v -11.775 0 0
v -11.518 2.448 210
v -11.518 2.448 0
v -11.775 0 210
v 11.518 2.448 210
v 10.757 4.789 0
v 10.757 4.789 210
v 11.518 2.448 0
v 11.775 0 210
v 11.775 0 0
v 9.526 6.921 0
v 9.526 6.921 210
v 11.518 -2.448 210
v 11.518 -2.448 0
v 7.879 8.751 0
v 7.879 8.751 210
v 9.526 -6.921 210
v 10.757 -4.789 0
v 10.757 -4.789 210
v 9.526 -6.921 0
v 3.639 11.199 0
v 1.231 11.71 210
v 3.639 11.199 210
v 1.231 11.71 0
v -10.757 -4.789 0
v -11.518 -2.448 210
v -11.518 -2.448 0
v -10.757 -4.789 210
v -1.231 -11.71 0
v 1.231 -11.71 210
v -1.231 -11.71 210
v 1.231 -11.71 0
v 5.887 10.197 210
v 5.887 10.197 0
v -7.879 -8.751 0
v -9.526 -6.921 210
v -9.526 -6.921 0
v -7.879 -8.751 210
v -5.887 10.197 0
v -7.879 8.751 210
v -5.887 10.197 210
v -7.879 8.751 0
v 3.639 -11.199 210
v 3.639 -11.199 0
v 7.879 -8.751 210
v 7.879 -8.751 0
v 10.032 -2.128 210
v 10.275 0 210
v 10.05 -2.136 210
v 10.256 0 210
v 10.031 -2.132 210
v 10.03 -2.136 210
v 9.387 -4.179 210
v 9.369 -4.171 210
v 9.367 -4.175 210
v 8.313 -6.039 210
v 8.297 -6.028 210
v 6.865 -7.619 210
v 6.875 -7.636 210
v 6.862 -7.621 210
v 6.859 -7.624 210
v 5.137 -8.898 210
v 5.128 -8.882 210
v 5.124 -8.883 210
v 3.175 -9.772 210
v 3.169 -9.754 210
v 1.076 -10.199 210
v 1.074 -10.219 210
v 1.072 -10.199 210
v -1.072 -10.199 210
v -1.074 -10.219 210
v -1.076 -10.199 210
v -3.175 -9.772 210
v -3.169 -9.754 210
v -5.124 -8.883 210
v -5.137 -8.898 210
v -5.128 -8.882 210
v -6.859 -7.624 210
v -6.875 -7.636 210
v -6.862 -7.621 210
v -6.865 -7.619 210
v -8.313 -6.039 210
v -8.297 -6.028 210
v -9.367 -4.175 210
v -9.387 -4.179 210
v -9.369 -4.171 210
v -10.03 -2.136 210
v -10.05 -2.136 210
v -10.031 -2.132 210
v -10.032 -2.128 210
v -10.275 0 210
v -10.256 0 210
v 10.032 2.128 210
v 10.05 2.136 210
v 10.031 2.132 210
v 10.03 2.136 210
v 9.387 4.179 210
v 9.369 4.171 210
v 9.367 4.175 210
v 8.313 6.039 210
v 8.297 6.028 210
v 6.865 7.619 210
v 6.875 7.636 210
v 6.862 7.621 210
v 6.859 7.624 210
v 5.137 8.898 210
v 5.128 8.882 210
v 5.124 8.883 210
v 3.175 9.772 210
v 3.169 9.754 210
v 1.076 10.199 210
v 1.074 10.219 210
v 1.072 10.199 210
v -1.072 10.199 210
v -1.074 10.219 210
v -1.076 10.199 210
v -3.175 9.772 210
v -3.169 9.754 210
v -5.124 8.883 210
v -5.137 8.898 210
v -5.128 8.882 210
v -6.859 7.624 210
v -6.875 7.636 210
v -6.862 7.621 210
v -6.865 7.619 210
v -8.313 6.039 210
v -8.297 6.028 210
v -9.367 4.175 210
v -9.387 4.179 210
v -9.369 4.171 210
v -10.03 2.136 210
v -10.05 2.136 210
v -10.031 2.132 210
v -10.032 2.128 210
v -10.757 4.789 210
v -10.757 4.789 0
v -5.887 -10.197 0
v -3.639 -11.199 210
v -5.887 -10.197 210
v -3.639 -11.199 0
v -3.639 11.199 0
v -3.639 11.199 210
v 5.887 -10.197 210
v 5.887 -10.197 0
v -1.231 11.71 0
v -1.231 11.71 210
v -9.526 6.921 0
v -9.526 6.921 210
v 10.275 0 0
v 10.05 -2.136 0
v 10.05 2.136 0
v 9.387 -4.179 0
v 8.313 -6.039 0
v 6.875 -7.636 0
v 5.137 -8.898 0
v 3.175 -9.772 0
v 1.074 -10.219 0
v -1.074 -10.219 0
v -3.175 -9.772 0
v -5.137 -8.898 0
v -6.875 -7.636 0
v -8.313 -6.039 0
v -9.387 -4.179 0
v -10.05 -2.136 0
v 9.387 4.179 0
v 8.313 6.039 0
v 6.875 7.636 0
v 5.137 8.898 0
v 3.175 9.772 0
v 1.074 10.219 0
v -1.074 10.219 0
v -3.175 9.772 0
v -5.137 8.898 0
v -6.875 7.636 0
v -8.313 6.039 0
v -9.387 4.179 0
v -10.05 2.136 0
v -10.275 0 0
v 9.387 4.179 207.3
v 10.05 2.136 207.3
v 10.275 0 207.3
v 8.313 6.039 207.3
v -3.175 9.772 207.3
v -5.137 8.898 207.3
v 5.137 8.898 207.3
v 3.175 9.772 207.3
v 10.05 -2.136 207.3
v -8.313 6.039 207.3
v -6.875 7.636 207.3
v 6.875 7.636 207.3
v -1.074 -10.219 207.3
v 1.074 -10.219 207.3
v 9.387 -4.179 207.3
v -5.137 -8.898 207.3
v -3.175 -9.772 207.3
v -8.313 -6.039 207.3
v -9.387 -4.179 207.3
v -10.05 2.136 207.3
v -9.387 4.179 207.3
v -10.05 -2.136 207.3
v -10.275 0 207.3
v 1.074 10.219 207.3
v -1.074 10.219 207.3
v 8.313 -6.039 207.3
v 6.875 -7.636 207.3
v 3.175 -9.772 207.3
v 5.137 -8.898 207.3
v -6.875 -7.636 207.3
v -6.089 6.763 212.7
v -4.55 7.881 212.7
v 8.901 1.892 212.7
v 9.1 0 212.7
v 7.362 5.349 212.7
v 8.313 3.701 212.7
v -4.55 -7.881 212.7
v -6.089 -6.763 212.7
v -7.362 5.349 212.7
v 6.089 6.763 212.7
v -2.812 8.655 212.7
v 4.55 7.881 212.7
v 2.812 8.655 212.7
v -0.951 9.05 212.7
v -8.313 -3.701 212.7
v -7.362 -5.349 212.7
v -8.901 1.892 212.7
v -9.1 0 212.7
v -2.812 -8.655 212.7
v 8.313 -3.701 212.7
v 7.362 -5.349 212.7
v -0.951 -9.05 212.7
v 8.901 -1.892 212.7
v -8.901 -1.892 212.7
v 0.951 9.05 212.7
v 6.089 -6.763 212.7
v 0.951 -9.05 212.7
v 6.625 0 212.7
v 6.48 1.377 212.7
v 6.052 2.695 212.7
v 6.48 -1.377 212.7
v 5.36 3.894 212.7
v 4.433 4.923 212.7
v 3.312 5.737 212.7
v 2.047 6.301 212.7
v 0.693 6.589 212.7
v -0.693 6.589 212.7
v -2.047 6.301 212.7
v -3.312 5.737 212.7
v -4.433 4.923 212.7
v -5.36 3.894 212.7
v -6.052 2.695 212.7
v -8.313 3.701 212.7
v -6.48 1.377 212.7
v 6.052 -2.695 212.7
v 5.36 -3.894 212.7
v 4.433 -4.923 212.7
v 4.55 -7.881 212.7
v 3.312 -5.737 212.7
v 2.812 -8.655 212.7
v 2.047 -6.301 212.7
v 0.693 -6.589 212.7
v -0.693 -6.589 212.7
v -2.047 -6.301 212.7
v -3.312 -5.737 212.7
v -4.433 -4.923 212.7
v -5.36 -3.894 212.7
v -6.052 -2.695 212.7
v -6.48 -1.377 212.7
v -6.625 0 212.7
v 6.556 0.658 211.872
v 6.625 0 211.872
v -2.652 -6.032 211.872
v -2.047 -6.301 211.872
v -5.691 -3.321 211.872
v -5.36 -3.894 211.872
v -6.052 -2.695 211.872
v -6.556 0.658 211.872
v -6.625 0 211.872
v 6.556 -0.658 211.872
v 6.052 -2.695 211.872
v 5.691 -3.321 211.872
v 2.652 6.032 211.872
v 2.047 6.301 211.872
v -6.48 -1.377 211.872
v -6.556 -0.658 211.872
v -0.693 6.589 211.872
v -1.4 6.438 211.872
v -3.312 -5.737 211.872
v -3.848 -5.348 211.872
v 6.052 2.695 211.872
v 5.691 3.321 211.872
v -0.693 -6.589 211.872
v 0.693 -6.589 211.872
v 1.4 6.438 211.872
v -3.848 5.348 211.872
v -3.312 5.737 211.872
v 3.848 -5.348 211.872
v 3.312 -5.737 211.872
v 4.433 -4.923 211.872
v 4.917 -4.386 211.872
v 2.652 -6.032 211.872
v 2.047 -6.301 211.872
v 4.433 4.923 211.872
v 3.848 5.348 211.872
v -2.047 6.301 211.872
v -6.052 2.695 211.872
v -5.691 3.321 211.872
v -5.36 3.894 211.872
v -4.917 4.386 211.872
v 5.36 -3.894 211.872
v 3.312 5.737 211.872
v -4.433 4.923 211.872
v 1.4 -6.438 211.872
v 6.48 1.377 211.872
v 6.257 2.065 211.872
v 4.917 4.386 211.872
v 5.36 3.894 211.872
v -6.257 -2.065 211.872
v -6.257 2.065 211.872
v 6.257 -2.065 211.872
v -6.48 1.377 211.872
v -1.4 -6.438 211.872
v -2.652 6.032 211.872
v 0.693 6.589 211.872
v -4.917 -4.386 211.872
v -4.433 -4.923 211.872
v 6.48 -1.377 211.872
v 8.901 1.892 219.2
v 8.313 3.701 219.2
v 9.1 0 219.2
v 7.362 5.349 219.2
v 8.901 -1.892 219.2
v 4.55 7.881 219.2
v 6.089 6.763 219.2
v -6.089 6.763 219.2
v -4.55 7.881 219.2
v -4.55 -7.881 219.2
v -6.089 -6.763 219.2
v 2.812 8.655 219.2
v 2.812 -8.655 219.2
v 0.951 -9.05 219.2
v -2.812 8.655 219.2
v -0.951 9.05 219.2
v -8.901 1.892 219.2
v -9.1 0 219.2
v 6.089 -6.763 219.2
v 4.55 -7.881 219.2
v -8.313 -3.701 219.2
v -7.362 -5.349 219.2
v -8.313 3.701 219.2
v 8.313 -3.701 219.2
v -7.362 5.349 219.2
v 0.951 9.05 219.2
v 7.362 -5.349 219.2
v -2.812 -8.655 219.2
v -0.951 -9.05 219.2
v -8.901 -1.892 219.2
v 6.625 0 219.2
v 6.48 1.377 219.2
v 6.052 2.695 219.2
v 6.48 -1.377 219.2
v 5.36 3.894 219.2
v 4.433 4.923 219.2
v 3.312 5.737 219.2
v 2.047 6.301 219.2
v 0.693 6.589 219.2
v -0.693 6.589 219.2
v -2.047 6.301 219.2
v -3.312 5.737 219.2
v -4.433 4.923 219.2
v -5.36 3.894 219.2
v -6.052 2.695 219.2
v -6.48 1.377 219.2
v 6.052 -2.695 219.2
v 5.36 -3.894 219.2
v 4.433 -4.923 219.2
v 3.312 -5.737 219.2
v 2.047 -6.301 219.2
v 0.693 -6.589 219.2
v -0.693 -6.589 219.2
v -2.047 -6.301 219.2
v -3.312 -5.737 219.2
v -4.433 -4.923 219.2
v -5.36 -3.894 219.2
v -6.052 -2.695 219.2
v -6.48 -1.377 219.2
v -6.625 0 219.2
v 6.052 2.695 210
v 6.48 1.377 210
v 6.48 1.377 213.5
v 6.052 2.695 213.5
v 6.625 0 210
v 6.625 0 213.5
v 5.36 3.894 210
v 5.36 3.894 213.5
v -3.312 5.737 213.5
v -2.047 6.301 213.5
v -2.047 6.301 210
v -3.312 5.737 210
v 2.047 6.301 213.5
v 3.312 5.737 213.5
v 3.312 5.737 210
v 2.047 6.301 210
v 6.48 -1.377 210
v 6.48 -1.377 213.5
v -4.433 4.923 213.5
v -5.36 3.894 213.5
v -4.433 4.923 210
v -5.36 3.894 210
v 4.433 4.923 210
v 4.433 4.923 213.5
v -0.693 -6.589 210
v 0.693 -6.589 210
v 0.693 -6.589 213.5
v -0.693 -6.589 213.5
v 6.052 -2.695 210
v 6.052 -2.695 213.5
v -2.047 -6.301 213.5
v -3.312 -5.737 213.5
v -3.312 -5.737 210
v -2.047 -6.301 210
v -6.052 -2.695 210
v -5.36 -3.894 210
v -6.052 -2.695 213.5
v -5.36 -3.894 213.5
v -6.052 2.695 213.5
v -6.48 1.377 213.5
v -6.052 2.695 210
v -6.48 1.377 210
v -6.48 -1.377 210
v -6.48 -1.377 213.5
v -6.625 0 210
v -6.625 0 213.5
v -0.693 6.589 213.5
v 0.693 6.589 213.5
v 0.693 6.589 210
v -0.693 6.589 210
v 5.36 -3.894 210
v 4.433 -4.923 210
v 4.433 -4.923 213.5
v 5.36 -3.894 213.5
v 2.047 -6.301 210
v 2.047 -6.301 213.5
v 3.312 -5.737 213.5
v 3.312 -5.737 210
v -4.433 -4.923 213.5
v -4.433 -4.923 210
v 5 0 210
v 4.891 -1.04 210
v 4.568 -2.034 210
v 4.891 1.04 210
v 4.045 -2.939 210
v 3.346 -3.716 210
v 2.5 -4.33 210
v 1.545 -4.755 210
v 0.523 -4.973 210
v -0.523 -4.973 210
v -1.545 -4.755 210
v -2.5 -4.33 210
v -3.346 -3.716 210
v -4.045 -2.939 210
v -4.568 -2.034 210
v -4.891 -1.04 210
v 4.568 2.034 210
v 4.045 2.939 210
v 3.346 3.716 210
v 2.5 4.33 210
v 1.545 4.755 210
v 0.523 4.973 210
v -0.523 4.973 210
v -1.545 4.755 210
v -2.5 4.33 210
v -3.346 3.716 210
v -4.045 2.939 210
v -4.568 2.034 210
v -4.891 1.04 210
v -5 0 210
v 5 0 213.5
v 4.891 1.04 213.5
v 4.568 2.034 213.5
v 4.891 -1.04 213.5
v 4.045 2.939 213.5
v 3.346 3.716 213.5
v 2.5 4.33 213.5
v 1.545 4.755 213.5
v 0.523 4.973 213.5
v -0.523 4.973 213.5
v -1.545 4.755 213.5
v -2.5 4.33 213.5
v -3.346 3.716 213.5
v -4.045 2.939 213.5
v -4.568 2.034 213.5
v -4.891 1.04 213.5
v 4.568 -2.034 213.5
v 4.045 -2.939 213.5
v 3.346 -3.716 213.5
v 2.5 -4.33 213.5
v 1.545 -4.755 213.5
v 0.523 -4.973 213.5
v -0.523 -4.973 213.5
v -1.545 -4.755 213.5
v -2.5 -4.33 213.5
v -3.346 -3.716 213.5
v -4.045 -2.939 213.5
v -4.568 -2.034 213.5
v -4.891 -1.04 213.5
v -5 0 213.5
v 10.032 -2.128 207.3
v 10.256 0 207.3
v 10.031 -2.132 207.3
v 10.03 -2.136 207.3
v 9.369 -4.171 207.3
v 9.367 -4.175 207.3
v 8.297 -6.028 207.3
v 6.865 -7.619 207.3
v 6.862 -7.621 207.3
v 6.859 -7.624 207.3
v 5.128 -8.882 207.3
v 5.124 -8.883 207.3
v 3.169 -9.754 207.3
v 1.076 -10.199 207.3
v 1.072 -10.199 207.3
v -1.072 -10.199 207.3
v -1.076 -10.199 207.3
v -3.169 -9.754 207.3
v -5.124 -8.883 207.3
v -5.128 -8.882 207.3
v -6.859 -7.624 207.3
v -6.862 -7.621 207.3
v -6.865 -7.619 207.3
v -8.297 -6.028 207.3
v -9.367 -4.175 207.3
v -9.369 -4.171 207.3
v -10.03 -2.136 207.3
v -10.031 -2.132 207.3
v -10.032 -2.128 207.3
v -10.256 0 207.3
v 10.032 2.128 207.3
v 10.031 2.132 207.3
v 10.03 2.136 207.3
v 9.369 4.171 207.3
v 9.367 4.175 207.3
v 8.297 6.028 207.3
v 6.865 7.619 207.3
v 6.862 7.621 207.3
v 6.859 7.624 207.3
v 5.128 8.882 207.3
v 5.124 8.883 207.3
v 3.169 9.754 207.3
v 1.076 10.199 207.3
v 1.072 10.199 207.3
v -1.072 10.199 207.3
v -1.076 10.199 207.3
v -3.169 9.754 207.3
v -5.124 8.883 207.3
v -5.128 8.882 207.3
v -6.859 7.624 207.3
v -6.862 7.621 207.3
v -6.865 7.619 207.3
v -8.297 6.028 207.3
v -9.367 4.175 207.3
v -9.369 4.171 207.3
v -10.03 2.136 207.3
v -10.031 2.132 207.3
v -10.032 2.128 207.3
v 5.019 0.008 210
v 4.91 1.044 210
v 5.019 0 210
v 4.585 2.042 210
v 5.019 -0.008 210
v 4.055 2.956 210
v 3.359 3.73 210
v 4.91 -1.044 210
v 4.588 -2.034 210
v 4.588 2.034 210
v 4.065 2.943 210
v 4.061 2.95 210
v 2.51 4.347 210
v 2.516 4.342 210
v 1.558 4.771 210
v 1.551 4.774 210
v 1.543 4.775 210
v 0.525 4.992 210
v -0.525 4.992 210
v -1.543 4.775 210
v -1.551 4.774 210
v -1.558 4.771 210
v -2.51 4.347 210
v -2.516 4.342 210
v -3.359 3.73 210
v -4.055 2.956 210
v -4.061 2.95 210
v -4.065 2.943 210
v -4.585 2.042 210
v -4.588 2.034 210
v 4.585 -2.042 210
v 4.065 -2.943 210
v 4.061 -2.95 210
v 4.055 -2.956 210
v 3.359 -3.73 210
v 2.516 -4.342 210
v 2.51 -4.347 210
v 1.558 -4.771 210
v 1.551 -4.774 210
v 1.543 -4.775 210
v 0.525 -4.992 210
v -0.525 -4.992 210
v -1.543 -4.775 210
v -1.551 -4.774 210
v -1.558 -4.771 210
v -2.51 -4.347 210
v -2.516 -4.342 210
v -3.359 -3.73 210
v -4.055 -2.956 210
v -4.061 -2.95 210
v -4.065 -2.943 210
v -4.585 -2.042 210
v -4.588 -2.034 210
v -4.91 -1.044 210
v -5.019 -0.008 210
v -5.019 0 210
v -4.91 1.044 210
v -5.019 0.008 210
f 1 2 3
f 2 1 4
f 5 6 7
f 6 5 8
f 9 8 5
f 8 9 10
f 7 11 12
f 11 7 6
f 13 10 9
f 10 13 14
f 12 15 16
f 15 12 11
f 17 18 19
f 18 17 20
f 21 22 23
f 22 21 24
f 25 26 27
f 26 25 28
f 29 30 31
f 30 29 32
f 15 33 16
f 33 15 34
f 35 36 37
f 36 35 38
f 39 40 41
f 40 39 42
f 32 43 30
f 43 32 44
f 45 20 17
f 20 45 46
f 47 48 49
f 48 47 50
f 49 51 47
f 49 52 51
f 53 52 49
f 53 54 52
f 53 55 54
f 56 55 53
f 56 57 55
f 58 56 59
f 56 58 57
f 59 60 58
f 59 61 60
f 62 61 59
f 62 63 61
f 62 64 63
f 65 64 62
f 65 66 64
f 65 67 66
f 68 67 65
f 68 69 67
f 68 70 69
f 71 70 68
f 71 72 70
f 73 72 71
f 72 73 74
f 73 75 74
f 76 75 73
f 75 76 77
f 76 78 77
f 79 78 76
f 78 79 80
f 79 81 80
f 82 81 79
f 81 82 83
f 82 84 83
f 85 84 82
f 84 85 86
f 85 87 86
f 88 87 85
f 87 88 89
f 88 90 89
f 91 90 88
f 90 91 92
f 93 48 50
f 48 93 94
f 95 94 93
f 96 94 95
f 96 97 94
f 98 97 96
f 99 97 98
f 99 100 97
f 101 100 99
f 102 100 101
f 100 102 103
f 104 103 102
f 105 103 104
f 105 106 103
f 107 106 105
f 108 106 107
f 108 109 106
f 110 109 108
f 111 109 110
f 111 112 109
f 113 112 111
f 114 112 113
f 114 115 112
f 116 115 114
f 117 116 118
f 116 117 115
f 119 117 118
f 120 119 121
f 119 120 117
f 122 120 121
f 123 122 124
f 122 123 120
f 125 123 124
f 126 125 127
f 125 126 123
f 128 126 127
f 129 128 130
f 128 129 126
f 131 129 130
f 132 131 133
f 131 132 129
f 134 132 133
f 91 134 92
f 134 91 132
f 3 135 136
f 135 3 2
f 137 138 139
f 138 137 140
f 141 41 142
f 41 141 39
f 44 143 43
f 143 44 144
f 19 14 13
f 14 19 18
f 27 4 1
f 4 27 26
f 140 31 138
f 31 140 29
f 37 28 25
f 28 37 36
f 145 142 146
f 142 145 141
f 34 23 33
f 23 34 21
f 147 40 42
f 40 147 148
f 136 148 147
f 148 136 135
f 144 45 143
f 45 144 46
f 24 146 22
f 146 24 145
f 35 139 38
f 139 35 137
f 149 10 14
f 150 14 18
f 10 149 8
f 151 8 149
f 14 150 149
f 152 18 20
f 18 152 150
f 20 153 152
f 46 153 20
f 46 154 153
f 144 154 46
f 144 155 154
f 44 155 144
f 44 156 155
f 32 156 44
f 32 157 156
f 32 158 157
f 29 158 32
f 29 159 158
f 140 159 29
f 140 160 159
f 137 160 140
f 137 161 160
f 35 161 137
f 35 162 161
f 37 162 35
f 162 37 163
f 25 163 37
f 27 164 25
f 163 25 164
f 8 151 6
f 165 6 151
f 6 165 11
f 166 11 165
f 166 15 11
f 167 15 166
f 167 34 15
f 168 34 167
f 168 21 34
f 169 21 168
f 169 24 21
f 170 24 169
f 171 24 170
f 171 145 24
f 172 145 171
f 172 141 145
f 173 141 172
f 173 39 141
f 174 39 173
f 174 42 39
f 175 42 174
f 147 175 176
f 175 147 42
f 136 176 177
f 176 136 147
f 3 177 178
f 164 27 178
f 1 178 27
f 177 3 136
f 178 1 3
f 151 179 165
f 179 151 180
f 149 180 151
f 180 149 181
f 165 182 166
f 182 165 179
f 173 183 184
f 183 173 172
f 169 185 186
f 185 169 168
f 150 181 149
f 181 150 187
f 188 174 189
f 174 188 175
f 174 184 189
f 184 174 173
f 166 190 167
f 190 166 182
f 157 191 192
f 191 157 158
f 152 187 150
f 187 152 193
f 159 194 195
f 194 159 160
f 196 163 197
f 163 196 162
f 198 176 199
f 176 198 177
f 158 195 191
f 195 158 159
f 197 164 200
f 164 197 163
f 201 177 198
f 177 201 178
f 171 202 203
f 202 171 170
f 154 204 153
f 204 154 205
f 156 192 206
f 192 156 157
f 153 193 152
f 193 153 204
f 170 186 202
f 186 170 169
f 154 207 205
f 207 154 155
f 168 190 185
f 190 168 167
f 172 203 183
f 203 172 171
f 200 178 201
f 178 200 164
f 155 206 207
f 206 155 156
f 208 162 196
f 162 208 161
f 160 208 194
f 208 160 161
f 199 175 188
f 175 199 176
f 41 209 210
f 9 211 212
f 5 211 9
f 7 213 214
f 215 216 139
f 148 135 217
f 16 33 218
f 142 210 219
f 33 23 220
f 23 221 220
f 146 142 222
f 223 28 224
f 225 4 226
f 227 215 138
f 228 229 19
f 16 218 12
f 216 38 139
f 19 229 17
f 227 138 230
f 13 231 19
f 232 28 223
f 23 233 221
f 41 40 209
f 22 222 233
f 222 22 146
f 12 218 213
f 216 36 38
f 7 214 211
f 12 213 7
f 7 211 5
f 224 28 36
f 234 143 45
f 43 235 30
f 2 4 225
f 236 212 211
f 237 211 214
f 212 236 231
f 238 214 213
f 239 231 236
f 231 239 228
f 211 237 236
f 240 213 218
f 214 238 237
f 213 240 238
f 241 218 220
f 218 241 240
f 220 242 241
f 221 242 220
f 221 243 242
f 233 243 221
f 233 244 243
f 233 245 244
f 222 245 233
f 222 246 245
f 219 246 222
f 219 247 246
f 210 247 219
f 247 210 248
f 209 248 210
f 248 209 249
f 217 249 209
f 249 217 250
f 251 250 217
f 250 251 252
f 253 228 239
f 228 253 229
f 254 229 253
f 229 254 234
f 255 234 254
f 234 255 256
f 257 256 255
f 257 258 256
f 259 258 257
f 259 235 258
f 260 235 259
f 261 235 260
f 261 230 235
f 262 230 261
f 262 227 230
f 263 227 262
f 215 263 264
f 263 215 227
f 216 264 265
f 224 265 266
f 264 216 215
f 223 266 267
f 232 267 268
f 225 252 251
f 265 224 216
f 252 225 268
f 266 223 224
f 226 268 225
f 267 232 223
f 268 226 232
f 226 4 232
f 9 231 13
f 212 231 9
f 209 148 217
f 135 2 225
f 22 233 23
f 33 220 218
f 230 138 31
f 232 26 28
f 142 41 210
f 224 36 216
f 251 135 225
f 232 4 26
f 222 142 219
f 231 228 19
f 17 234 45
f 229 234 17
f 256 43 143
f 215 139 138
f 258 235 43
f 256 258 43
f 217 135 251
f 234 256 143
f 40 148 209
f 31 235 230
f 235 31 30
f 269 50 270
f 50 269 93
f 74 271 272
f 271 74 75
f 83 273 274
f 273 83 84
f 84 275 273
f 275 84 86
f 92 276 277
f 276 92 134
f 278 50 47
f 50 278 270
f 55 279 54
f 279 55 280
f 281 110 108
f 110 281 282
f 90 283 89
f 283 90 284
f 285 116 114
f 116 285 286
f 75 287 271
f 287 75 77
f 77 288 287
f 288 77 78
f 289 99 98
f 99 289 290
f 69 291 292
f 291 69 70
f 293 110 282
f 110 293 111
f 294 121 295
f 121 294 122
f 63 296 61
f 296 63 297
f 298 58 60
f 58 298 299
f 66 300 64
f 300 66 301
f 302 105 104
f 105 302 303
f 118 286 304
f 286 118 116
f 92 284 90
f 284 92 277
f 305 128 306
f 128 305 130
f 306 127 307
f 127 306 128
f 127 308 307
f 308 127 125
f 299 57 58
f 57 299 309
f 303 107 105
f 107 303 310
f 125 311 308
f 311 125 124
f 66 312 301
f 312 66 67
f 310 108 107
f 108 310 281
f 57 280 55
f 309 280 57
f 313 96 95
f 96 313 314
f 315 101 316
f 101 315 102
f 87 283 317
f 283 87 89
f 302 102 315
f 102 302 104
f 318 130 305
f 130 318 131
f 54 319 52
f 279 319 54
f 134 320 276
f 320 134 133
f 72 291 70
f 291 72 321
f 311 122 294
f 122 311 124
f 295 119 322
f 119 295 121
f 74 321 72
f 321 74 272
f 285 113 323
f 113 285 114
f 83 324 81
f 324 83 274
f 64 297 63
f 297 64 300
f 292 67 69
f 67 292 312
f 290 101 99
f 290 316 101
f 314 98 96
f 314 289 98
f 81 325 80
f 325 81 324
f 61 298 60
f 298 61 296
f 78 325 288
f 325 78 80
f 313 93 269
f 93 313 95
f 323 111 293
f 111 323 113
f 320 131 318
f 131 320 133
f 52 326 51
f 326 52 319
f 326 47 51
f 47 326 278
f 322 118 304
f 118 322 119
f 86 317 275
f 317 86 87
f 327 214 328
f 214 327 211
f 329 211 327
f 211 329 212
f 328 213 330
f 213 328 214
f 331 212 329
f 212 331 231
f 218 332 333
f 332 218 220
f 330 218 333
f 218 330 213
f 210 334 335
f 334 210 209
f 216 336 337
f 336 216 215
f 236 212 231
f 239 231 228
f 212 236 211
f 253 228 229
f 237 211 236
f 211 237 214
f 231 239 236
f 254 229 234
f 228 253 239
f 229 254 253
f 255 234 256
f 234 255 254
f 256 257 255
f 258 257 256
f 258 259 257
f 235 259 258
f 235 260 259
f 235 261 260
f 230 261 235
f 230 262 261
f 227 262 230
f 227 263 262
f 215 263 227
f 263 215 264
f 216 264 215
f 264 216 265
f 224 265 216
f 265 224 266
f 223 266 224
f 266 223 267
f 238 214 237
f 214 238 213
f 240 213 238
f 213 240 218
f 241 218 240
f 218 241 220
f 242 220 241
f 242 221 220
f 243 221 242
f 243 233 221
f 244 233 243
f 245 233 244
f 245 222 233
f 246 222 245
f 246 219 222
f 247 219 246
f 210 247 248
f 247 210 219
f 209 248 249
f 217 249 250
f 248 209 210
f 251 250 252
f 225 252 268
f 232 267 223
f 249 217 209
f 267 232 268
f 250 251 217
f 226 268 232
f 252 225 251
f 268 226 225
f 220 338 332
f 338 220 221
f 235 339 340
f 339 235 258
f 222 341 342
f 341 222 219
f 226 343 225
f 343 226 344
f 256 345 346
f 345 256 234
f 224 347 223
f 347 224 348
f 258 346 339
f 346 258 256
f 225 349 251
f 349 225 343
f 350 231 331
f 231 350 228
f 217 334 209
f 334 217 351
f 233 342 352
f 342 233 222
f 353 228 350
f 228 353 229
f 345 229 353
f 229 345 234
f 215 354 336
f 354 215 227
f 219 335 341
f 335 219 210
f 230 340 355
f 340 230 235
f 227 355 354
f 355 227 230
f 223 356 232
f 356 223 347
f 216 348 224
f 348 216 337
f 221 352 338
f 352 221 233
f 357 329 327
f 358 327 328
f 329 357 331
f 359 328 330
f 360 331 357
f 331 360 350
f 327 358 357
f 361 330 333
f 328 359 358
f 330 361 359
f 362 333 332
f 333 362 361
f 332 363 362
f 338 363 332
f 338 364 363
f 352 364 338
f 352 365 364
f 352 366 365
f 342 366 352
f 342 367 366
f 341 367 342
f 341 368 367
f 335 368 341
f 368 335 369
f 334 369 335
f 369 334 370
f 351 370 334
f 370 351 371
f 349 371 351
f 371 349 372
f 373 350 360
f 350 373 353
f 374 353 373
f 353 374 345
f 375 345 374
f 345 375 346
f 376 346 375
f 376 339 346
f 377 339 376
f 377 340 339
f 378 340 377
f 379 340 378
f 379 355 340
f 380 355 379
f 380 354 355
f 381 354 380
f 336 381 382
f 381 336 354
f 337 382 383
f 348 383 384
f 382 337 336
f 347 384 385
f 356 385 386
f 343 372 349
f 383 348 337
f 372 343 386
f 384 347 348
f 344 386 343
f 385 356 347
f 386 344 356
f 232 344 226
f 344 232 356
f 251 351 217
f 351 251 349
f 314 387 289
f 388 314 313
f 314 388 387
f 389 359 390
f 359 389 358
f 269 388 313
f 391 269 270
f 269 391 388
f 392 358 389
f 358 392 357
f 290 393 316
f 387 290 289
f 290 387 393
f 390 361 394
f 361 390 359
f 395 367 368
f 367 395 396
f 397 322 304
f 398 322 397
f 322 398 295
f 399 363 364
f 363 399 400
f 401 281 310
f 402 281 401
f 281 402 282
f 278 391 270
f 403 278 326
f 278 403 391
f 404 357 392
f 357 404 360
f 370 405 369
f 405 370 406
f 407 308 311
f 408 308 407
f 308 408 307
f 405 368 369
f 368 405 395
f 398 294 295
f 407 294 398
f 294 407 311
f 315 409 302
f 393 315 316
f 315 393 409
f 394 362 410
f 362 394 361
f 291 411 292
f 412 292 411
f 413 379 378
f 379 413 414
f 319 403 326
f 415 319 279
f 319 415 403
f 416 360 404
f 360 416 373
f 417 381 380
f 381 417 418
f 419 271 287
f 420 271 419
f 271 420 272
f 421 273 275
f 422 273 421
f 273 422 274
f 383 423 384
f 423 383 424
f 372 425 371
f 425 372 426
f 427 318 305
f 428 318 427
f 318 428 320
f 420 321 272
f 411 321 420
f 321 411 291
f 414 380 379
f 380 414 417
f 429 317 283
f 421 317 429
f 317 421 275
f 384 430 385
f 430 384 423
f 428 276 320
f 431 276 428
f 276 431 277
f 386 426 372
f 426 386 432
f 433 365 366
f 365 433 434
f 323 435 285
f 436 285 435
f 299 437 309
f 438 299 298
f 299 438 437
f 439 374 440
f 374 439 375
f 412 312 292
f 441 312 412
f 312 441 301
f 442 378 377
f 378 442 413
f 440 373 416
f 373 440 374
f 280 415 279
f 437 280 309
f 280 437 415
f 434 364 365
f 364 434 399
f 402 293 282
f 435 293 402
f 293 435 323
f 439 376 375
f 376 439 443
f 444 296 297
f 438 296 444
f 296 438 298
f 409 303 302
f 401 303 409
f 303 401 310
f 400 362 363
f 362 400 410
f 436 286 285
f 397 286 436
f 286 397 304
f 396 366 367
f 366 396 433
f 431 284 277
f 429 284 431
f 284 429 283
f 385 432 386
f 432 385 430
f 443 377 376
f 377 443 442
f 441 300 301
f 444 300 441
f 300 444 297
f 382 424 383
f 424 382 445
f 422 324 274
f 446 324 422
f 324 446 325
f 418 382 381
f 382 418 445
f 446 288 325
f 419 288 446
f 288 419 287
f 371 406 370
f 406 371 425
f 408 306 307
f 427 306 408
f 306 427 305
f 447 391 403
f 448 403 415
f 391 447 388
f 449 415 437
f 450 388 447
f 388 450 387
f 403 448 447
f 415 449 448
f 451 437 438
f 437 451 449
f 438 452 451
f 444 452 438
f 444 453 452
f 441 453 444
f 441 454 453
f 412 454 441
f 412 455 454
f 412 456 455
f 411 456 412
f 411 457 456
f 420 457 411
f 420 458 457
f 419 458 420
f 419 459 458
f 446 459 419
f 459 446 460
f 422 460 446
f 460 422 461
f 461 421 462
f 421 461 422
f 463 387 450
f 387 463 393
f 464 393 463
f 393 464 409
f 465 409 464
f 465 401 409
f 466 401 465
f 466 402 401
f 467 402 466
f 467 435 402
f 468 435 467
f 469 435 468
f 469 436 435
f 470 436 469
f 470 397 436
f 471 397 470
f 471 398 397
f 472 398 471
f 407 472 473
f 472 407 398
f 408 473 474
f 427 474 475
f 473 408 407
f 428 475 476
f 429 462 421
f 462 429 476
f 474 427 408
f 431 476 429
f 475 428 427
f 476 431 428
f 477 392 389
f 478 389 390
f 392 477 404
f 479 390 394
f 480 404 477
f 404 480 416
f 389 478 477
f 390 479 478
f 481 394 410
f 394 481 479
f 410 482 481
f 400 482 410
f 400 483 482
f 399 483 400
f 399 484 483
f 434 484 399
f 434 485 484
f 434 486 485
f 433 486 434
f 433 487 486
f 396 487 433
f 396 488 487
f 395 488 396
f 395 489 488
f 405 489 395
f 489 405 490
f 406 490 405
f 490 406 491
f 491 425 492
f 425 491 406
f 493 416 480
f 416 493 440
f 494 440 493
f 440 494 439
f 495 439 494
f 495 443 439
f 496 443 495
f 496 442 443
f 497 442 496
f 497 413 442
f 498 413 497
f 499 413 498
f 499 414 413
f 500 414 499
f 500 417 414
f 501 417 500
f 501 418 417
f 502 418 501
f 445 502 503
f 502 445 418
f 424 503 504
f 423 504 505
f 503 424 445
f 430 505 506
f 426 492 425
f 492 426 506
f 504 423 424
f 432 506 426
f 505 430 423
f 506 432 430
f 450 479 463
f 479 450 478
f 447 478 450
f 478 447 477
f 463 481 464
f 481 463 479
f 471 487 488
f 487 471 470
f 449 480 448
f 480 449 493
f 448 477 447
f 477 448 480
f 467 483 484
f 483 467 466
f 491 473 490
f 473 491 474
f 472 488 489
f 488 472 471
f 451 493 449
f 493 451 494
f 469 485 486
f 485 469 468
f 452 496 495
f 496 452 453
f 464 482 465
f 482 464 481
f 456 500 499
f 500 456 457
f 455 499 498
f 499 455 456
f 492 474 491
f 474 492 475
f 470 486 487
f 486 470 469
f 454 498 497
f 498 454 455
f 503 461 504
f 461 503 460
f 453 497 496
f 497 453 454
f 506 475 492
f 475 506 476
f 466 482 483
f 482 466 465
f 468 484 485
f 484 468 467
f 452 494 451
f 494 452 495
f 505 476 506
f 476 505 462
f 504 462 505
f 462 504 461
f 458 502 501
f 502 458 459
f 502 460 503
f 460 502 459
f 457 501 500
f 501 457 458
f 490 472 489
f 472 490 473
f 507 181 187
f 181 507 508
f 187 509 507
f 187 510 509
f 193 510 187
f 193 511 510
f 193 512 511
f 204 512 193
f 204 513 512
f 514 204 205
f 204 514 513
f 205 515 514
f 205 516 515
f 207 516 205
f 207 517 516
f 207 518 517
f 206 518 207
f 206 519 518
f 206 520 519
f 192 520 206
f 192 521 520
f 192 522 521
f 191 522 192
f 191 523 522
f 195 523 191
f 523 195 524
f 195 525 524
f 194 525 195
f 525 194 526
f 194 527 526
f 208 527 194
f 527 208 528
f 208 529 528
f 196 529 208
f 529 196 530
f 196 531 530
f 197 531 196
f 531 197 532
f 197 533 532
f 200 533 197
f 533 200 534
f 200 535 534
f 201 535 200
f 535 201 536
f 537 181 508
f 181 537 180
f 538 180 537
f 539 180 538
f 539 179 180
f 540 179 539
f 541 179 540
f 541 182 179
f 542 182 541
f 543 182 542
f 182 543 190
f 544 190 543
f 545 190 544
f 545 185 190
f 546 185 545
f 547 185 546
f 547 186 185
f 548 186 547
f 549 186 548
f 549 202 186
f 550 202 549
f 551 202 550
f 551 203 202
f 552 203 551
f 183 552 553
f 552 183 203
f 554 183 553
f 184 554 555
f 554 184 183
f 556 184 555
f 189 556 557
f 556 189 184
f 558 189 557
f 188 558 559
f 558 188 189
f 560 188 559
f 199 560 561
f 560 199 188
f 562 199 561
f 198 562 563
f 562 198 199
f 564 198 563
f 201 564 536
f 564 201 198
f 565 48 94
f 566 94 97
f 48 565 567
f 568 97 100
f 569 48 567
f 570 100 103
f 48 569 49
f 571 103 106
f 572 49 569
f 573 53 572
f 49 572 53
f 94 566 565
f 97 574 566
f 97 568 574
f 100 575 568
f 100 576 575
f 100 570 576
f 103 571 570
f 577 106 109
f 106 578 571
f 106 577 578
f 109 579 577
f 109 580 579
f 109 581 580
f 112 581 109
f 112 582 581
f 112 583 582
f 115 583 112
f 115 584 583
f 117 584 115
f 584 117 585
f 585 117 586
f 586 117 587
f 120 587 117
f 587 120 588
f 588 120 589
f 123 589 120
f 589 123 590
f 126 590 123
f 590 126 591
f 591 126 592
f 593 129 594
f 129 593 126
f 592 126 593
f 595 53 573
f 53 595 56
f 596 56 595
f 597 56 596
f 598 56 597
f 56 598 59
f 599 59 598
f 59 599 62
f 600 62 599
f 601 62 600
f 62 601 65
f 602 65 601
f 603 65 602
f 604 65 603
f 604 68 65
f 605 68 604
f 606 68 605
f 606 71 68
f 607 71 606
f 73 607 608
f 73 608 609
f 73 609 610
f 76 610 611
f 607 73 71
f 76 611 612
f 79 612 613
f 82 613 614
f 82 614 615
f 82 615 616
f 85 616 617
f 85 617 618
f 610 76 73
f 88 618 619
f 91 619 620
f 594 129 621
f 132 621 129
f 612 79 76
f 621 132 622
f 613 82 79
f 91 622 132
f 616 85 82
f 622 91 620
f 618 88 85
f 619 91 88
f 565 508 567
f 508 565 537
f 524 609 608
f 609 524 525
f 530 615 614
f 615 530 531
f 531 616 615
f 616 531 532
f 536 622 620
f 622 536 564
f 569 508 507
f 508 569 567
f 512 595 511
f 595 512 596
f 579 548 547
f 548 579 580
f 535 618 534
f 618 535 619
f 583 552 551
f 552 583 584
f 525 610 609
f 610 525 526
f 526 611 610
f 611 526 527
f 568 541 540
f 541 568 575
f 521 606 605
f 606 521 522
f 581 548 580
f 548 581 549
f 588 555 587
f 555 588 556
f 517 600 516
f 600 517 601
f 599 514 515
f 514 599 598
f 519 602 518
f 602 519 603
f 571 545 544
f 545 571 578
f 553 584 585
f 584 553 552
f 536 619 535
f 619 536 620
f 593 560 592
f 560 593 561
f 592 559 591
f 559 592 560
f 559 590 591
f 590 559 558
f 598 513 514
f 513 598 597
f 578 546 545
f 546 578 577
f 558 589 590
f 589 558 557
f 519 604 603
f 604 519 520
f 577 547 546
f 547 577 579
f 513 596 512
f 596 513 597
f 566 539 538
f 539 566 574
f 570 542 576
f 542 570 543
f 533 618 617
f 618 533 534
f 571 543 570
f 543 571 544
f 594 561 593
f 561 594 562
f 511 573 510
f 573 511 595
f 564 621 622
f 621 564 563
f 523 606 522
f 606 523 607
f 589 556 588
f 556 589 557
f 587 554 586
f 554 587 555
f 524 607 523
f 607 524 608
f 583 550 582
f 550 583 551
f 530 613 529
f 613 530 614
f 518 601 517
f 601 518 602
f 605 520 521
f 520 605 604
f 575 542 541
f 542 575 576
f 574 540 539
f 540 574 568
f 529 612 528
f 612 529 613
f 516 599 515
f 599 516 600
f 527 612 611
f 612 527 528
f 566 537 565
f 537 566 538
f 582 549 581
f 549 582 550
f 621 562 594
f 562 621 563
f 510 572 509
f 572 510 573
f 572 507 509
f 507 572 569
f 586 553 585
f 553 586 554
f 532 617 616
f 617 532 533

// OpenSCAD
/*
Anemometer custom pipe fitting
Remixed from https://www.thingiverse.com/thing:5997239

Created November 27, 2023
Modified August 22, 2024

2/14/2024 - reduced cone_h 3.5 -> 2.7
2/25/2024 - increased bott_pipe_h 25 -> 30
8/22/2024 - increased bott_pipe_h 30 -> 210
*/

$fs = 0.1;

wall_t = 1.5;

pipe_id = 20.55;
pipe_od = pipe_id + wall_t * 2;
bott_pipe_h = 210;

cone1_od1 = pipe_od;
cone1_od2 = 18.2;
cone_h = 2.7;

top_od = cone1_od2;
top_id = 13.25;
top_h = 6.5;

ring_h = 3.5;
ring_d = top_id;
scr_hole_d = 10;

err = 0.01; // OpenSCAD visual rendering error
err_trans = [0, 0, -err]; // common translation vector for viewing purposes

// bottom
difference() {
    cylinder(d=pipe_od, h=bott_pipe_h);
    translate(err_trans)
    cylinder(d=pipe_id, h=bott_pipe_h + err * 2);
}

// cone
translate([0, 0, bott_pipe_h])
difference() {
    cylinder(d1=cone1_od1, d2=cone1_od2, h=cone_h);
    translate(err_trans)
    cylinder(d1=pipe_id, d2=10, h=cone_h + err * 2);
}

// outer ring
translate([0, 0, bott_pipe_h + cone_h]) {
    difference() {
        cylinder(d=top_od, h=top_h);
        translate(err_trans)
        cylinder(d=top_id, h=top_h + err * 2);
    }
}

// top inner ring
translate([0, 0, bott_pipe_h]) {
    difference() {
        cylinder(d=ring_d, h=ring_h);
        translate(err_trans)
        cylinder(d=scr_hole_d, h=ring_h + err * 2);
    }
}

// middle inner ring
translate([0, 0, bott_pipe_h - cone_h])
    difference() {
        cylinder(d=pipe_id, h=cone_h);
        translate(err_trans)
        cylinder(d1=pipe_id, d2=scr_hole_d, h=cone_h + err * 2);
    }
